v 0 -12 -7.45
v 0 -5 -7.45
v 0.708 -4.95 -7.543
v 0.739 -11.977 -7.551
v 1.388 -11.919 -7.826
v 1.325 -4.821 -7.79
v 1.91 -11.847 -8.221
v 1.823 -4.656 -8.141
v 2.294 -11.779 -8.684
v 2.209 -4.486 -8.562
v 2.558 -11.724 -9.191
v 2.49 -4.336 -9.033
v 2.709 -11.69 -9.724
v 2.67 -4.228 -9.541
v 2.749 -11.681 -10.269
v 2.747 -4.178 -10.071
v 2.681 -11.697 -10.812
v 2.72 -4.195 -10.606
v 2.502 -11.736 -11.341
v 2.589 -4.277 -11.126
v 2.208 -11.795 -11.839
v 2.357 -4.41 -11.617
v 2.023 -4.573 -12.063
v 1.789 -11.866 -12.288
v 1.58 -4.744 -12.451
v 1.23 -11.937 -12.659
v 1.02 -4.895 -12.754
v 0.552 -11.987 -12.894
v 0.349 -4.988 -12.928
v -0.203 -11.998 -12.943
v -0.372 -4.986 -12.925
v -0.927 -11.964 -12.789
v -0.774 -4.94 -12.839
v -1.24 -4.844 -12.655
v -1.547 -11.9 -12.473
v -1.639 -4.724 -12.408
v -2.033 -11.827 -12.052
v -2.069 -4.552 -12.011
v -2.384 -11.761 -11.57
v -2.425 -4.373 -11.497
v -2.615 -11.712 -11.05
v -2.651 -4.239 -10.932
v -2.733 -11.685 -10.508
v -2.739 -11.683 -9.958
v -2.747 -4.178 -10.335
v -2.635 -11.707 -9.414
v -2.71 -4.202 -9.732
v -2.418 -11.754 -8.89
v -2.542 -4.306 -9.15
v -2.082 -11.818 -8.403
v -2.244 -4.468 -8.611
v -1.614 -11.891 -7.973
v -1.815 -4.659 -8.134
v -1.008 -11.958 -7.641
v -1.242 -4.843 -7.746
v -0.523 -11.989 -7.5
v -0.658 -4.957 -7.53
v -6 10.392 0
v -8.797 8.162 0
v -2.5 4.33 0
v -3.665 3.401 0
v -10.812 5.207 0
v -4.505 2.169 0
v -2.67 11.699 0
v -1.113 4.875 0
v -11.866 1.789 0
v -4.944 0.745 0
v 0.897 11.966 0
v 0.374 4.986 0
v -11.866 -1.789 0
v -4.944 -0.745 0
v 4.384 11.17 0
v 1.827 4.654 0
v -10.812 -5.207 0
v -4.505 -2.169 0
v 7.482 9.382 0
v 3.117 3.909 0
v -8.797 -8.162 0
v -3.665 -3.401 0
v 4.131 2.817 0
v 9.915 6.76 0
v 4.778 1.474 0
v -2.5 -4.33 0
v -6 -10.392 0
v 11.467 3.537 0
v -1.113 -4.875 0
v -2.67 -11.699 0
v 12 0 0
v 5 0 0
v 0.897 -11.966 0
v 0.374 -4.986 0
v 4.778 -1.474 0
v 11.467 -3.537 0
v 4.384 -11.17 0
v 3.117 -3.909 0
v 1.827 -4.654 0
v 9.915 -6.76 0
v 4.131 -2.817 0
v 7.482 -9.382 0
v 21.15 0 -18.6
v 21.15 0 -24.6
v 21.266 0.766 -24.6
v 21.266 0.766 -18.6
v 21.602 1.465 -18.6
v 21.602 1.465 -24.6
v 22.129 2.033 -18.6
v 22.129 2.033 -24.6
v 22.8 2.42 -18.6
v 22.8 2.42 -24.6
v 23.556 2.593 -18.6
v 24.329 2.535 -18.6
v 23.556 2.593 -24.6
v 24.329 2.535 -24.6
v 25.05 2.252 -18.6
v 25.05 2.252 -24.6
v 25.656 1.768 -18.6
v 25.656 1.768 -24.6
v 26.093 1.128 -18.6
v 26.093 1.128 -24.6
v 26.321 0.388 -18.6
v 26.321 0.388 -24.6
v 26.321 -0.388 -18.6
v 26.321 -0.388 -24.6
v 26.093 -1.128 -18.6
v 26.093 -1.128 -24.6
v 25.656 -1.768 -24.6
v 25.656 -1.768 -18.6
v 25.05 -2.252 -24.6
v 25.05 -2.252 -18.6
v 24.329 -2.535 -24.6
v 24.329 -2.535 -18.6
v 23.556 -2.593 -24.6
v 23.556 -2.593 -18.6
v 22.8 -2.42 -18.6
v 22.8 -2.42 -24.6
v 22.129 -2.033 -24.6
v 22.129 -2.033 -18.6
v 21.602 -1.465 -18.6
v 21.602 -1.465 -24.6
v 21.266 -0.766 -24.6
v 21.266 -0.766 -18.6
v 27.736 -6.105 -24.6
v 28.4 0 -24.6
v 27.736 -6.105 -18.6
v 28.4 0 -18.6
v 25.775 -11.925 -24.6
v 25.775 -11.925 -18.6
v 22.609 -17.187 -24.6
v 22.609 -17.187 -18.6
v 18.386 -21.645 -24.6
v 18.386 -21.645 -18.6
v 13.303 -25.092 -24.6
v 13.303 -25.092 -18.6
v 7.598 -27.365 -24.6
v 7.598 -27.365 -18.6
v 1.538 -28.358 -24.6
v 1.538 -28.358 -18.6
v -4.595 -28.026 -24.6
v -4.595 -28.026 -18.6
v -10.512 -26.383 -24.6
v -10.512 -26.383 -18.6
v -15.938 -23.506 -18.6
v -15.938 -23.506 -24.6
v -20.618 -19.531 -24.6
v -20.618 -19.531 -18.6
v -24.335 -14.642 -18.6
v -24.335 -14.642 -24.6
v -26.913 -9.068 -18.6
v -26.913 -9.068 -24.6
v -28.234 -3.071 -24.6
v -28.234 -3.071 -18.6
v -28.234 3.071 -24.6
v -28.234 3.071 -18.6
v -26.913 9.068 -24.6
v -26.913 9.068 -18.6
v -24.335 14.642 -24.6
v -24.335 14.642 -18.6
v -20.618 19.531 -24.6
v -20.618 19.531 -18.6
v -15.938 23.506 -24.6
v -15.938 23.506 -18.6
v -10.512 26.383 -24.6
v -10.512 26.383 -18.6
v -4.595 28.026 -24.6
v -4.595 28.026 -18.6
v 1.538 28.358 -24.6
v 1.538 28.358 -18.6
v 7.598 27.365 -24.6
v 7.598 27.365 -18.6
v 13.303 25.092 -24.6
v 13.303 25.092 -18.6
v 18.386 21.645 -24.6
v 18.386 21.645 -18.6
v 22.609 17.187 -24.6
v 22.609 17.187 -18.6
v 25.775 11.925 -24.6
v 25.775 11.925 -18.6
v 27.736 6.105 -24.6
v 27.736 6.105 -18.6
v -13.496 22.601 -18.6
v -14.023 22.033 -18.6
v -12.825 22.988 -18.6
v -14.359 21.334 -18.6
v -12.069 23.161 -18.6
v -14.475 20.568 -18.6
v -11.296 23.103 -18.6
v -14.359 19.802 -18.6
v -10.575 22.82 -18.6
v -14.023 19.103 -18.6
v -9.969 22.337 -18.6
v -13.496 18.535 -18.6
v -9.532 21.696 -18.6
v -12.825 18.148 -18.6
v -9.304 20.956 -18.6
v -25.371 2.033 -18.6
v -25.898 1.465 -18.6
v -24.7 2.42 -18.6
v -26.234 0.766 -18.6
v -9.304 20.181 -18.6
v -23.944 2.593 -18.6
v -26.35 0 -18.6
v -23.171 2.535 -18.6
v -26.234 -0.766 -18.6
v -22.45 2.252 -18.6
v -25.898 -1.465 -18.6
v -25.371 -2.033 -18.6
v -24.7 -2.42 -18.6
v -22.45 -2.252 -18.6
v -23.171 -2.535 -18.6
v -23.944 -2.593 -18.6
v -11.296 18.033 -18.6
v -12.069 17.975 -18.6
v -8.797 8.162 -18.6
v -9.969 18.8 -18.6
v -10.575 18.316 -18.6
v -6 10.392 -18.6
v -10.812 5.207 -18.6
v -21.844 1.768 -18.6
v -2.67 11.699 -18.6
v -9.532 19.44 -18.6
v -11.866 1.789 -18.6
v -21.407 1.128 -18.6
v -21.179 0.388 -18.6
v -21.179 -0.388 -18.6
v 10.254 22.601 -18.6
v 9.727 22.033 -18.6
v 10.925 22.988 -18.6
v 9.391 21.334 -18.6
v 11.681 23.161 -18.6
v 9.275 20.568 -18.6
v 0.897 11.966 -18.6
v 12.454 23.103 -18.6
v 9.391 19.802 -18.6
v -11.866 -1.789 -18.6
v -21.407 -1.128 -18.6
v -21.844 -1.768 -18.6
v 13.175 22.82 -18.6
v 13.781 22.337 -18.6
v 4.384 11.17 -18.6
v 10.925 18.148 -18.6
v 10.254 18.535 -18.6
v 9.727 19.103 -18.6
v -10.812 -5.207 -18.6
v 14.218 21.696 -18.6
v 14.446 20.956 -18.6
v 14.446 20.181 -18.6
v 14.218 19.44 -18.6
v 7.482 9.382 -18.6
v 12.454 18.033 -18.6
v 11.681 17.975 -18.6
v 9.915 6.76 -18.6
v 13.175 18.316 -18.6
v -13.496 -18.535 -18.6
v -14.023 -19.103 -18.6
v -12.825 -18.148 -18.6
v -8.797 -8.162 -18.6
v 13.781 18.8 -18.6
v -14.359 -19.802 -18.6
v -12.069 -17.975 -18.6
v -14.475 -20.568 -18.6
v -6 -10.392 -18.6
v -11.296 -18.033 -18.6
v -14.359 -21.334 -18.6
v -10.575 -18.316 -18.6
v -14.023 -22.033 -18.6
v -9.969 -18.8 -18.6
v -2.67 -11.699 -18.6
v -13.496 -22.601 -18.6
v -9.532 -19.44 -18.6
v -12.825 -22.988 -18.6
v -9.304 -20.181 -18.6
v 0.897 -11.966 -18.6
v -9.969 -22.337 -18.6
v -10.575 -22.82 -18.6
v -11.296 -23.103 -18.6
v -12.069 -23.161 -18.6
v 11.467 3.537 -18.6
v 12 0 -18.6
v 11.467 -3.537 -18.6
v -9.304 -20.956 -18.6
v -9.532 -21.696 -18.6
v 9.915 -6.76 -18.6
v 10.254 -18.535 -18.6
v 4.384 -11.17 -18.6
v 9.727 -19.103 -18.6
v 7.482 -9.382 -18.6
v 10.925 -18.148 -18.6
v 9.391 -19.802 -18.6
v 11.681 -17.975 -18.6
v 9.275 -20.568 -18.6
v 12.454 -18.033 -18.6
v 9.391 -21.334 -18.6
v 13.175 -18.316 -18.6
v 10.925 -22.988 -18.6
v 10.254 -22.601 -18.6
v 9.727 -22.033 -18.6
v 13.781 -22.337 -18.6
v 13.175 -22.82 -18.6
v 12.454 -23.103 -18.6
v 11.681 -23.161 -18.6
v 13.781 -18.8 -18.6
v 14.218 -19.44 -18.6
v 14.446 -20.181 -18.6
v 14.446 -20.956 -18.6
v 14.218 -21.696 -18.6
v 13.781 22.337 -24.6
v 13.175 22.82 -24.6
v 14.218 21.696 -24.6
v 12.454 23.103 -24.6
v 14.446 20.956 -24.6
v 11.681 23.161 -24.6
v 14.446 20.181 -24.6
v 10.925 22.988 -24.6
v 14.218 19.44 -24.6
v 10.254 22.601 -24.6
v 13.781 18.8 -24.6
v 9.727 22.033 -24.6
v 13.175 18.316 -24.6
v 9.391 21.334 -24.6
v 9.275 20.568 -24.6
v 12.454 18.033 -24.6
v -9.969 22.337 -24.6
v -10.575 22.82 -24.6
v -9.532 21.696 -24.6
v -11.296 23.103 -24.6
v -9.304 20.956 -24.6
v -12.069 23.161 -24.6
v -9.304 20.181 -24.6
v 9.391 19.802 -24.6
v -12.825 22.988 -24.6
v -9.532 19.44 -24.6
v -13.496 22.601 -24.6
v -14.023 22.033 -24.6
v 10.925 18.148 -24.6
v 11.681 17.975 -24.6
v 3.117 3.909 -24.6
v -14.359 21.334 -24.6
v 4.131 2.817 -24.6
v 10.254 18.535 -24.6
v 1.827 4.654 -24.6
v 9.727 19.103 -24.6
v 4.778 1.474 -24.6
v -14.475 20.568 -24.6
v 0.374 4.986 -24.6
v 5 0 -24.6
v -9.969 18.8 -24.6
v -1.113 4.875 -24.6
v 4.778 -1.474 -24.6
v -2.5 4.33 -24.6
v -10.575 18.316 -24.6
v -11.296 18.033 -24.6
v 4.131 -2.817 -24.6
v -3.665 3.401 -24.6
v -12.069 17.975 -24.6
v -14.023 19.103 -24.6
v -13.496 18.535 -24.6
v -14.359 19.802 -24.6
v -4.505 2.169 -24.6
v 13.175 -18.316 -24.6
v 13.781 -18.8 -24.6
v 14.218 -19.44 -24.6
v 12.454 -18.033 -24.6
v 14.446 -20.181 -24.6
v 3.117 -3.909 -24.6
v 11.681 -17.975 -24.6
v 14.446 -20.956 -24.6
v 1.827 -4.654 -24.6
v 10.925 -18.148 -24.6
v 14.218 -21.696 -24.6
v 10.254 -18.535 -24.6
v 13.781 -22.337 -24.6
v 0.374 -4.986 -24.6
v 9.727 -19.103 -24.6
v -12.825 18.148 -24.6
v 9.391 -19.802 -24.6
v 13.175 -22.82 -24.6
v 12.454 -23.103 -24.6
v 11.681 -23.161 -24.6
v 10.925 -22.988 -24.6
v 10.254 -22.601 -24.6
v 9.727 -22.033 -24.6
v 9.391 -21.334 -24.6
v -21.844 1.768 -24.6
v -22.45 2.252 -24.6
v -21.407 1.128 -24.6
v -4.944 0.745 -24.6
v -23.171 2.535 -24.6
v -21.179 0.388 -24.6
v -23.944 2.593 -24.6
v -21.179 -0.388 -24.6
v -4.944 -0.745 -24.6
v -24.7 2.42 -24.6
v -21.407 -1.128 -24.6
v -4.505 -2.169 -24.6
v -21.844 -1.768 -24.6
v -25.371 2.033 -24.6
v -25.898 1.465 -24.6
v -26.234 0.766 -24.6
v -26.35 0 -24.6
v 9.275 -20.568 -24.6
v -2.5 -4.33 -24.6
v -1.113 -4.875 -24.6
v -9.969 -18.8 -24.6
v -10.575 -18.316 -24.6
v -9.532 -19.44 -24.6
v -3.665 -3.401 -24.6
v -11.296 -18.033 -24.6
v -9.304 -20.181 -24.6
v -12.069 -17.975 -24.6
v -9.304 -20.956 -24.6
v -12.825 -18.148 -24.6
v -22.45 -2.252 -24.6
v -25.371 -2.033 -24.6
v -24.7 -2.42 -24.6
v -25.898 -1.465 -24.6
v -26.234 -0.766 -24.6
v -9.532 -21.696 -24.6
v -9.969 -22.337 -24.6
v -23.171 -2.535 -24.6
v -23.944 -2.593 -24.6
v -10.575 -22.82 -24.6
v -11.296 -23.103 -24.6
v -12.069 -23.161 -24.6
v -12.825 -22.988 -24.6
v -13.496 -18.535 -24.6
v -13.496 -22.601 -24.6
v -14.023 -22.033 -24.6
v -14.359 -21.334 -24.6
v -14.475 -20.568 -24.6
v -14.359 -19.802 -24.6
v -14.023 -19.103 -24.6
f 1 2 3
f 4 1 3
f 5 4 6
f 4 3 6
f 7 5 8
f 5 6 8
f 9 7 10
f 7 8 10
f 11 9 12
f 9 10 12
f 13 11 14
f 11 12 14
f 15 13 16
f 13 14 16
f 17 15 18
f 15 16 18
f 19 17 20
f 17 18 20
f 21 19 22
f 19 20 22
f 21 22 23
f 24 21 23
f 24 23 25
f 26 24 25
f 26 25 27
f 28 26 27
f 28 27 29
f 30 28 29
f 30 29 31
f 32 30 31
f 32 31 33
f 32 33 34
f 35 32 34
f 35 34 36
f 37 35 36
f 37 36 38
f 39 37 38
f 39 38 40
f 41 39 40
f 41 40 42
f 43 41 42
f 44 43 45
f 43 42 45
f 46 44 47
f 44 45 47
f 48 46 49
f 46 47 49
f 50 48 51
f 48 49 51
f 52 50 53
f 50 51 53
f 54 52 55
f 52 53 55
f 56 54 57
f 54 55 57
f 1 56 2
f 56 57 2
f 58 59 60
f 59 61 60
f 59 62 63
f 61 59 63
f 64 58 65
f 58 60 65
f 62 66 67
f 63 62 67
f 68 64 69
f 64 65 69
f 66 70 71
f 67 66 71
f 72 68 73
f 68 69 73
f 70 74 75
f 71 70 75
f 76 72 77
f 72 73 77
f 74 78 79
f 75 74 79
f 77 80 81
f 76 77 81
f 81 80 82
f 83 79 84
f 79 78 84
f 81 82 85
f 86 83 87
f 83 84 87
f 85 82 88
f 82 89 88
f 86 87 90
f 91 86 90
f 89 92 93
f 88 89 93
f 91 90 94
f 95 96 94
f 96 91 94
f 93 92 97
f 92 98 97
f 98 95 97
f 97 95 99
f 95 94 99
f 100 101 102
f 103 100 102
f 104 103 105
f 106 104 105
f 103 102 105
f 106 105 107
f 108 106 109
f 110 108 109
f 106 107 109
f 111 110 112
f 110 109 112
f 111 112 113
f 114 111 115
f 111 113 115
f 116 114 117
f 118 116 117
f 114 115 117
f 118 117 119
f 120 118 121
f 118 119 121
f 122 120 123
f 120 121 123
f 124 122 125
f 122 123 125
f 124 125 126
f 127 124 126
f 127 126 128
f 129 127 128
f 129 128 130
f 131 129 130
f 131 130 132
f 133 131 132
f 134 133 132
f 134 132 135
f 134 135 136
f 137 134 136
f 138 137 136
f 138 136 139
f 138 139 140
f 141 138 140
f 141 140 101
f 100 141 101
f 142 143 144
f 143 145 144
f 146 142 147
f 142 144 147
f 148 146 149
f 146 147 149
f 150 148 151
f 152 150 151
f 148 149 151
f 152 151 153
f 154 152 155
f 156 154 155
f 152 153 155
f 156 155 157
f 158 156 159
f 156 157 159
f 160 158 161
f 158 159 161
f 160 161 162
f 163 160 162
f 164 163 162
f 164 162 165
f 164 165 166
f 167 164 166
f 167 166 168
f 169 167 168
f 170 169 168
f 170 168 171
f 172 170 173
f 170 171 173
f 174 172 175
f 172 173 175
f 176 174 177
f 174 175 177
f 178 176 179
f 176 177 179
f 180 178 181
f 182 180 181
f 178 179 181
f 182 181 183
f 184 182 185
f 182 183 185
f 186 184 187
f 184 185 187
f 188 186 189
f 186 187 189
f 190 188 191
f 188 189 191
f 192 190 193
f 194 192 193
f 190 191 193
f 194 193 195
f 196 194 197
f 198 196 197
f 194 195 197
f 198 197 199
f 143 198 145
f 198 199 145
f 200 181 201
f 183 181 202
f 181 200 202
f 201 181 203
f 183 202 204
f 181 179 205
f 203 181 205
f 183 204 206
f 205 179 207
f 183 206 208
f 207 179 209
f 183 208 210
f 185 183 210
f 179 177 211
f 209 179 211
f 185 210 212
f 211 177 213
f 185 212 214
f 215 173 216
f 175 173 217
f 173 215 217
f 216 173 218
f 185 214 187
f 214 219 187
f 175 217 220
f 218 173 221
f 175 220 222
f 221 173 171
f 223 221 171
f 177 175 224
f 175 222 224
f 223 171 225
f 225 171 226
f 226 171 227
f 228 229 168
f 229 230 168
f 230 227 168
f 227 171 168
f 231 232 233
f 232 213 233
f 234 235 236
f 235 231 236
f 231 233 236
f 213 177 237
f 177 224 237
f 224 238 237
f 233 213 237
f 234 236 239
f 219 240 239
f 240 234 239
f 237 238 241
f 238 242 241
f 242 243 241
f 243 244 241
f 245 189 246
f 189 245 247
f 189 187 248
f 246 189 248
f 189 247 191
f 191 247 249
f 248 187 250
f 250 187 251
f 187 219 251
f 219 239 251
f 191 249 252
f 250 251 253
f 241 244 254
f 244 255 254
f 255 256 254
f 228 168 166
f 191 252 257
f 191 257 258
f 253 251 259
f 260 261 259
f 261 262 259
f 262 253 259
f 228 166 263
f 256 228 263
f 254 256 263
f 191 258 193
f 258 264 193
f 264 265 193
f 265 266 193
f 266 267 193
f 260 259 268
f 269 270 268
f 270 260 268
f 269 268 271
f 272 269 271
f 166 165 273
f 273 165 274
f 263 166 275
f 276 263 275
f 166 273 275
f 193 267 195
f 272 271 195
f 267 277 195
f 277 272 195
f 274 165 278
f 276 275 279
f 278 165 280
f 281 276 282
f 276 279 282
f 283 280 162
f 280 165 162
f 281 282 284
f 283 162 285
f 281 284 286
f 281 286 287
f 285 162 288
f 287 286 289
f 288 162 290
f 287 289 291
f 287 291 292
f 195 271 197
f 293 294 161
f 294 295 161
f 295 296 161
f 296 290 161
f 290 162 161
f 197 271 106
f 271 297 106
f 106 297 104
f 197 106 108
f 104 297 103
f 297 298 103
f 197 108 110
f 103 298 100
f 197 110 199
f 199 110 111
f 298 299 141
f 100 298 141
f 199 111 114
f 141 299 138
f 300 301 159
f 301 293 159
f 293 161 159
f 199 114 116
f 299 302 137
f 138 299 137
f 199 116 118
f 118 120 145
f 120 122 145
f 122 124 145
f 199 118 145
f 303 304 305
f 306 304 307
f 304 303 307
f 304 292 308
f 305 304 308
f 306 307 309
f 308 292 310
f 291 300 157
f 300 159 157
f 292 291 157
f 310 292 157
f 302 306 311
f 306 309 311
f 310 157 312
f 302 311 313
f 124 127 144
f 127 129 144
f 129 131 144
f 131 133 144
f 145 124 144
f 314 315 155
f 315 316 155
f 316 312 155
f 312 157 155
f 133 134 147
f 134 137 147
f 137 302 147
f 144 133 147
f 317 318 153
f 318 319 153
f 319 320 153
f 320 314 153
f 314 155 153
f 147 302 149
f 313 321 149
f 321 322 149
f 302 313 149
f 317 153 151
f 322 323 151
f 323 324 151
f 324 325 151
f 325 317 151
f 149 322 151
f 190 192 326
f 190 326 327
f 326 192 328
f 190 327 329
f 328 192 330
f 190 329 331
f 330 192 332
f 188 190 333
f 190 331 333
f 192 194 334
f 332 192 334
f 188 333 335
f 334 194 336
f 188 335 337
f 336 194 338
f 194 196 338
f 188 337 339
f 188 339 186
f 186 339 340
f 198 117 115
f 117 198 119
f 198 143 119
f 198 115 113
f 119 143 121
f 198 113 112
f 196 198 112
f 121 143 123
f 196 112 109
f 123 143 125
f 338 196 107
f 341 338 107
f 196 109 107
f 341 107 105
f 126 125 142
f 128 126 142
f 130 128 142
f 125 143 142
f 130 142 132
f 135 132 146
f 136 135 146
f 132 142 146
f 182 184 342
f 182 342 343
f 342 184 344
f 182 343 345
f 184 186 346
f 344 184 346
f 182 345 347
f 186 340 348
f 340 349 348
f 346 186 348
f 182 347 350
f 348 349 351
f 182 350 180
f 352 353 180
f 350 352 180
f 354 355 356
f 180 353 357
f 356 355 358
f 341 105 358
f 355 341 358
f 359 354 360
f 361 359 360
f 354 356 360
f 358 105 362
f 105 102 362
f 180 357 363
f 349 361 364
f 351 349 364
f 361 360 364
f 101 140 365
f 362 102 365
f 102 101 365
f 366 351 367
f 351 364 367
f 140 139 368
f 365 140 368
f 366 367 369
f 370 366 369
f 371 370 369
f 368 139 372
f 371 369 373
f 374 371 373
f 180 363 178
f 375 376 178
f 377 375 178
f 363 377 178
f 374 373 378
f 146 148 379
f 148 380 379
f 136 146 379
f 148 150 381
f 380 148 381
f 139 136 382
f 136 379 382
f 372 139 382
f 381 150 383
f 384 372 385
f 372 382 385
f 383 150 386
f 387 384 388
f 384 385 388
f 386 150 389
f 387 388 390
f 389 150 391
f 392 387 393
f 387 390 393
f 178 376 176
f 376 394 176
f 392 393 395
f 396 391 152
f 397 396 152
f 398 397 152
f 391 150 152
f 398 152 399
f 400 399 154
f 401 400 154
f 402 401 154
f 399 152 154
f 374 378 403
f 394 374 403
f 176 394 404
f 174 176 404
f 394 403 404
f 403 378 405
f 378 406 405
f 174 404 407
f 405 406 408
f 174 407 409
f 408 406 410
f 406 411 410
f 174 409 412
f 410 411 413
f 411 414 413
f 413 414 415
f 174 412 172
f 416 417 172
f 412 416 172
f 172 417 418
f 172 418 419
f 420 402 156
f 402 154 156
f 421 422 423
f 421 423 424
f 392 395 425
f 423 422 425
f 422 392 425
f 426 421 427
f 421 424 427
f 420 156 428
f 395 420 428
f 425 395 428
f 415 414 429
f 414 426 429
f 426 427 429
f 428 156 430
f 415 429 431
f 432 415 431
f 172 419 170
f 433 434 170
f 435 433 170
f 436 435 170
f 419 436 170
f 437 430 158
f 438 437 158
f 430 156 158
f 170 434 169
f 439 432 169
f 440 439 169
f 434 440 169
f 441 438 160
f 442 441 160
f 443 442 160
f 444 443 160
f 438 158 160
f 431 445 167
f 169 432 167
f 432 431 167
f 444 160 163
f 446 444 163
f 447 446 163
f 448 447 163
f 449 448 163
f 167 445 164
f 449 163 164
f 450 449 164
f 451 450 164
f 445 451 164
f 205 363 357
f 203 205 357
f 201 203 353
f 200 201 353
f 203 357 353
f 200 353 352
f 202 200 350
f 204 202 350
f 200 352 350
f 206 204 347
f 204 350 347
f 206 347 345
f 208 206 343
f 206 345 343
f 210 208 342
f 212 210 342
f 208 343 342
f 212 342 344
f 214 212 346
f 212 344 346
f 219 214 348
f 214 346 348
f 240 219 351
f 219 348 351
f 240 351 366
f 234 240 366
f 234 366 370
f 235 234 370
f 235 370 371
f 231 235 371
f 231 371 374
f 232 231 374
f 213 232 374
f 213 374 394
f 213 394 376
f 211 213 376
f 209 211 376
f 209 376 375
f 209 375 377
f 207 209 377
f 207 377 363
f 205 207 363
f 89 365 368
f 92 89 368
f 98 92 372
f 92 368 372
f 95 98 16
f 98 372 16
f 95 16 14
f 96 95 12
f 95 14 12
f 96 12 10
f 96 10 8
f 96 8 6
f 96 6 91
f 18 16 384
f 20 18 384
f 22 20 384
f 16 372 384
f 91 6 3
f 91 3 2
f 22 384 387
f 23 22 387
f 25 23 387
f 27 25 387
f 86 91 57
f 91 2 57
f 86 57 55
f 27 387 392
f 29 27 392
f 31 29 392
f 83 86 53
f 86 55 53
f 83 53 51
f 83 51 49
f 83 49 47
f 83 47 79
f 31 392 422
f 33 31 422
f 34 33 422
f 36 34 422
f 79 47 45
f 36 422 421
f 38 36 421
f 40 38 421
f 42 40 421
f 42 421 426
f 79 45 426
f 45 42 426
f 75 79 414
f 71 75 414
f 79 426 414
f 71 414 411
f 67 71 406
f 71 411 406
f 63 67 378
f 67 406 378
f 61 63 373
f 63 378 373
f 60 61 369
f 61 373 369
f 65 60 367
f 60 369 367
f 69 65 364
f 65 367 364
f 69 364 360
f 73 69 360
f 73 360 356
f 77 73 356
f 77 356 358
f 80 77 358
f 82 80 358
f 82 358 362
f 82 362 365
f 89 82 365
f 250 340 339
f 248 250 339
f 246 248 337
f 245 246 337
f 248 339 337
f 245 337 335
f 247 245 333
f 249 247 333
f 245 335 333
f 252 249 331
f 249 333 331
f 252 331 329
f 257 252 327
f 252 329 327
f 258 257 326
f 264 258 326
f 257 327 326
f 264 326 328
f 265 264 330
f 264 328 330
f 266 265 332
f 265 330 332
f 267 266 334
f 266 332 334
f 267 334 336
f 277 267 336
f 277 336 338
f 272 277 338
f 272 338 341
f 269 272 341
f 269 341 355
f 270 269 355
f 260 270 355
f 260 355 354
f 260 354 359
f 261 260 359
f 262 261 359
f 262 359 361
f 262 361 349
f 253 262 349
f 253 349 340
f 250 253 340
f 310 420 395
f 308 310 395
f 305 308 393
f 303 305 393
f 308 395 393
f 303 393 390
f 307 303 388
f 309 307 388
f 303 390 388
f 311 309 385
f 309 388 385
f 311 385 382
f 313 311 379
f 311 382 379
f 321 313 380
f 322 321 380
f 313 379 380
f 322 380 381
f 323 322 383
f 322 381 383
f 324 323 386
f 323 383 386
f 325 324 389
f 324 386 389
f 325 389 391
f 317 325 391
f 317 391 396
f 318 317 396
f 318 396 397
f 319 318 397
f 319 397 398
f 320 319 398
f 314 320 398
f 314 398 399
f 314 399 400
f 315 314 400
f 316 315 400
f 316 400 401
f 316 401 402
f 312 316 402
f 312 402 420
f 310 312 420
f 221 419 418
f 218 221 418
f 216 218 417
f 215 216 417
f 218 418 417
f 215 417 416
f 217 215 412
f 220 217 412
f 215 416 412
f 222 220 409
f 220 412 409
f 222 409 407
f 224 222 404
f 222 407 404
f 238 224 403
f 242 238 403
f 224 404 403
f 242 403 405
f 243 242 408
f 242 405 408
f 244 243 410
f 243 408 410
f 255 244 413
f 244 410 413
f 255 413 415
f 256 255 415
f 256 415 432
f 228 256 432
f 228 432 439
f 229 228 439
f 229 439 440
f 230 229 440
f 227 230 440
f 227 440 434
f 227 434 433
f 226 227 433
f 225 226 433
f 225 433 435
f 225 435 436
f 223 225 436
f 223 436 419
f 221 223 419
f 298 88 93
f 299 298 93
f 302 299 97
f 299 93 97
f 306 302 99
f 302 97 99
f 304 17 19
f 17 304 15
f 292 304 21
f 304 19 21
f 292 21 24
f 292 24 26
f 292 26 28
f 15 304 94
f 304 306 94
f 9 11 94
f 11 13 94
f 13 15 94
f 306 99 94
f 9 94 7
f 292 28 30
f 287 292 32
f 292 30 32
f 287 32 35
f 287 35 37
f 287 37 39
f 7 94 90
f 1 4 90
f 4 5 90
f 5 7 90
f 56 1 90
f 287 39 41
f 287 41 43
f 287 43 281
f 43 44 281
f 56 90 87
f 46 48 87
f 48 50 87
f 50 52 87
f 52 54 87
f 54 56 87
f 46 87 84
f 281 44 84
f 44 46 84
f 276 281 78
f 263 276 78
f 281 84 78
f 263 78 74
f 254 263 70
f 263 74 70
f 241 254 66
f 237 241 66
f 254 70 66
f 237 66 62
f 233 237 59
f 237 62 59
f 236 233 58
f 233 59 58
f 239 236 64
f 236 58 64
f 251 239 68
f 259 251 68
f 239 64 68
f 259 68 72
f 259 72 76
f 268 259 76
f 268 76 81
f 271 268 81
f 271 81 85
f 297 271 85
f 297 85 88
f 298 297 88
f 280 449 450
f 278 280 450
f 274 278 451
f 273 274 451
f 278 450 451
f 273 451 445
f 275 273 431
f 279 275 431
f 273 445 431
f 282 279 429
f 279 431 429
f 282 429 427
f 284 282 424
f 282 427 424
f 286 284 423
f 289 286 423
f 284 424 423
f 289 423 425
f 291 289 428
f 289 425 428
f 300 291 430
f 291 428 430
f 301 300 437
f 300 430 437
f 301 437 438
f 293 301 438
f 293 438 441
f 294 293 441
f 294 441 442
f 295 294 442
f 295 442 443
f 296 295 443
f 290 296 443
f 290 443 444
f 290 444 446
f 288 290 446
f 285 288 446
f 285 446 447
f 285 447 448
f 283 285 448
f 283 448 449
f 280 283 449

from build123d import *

# Parameters (mm, degrees)
SKETCH2_R               = 2.6
CUT_EXTRUDE1_DEPTH      = 48.098619937
CUT_EXTRUDE2_REACH      = 49.099
CUT_EXTRUDE2_END_RADIUS = 12
SKETCH3_R               = 2.75


with BuildPart() as part:
    # Sketch1 → Revolve1 (revolve)
    with BuildSketch(Plane(origin=(0, 0, 0), x_dir=(1, 0, 0), z_dir=(0, 1, 0)), mode=Mode.PRIVATE) as revolve1_sk:
        Polygon((-5, 24.6), (-28.4, 24.6), (-28.4, 18.6), (-12, 18.6), (-12, 0), (-5, 0), align=None)
    revolve(revolve1_sk.sketch.rotate(Axis((0, 0, 0), (0, 0, -1)), 180), axis=Axis((0, 0, 0), (0, 0, -1)))

    # Sketch2 → Cut-Extrude1 (cut, through all)
    with BuildSketch(Plane(origin=(0, 0, -24.6), x_dir=(-1, 0, 0), z_dir=(0, 0, -1))):
        with Locations((-23.75, 0)):
            Circle(SKETCH2_R)
        with Locations((-11.875, 20.56810334)):
            Circle(SKETCH2_R)
        with Locations((11.875, 20.56810334)):
            Circle(SKETCH2_R)
        with Locations((23.75, 0)):
            Circle(SKETCH2_R)
        with Locations((11.875, -20.56810334)):
            Circle(SKETCH2_R)
        with Locations((-11.875, -20.56810334)):
            Circle(SKETCH2_R)
    extrude(amount=-CUT_EXTRUDE1_DEPTH, mode=Mode.SUBTRACT)

    # Cut-Extrude2: up to this cylinder (the profile starts inside it)
    cut_extrude2_end = Plane(origin=(0, 0, -10.2), z_dir=(0, 0, 1)) * Cylinder(CUT_EXTRUDE2_END_RADIUS, 123.198, mode=Mode.PRIVATE)
    # Sketch3 → Cut-Extrude2 (cut, up to the surface)
    with BuildSketch(Plane(origin=(0, 0, 0), x_dir=(1, 0, 0), z_dir=(0, 1, 0)), mode=Mode.PRIVATE) as cut_extrude2_sk1:
        with Locations(Location((0, 10.2, 0), (0, 0, 270))):
            Circle(SKETCH3_R)
    cut_extrude2_tool1 = extrude(cut_extrude2_sk1.sketch, amount=-CUT_EXTRUDE2_REACH, mode=Mode.PRIVATE) & cut_extrude2_end
    add(cut_extrude2_tool1.solids().sort_by_distance((0, 0, -10.2))[0], mode=Mode.SUBTRACT)


solid = part.part
